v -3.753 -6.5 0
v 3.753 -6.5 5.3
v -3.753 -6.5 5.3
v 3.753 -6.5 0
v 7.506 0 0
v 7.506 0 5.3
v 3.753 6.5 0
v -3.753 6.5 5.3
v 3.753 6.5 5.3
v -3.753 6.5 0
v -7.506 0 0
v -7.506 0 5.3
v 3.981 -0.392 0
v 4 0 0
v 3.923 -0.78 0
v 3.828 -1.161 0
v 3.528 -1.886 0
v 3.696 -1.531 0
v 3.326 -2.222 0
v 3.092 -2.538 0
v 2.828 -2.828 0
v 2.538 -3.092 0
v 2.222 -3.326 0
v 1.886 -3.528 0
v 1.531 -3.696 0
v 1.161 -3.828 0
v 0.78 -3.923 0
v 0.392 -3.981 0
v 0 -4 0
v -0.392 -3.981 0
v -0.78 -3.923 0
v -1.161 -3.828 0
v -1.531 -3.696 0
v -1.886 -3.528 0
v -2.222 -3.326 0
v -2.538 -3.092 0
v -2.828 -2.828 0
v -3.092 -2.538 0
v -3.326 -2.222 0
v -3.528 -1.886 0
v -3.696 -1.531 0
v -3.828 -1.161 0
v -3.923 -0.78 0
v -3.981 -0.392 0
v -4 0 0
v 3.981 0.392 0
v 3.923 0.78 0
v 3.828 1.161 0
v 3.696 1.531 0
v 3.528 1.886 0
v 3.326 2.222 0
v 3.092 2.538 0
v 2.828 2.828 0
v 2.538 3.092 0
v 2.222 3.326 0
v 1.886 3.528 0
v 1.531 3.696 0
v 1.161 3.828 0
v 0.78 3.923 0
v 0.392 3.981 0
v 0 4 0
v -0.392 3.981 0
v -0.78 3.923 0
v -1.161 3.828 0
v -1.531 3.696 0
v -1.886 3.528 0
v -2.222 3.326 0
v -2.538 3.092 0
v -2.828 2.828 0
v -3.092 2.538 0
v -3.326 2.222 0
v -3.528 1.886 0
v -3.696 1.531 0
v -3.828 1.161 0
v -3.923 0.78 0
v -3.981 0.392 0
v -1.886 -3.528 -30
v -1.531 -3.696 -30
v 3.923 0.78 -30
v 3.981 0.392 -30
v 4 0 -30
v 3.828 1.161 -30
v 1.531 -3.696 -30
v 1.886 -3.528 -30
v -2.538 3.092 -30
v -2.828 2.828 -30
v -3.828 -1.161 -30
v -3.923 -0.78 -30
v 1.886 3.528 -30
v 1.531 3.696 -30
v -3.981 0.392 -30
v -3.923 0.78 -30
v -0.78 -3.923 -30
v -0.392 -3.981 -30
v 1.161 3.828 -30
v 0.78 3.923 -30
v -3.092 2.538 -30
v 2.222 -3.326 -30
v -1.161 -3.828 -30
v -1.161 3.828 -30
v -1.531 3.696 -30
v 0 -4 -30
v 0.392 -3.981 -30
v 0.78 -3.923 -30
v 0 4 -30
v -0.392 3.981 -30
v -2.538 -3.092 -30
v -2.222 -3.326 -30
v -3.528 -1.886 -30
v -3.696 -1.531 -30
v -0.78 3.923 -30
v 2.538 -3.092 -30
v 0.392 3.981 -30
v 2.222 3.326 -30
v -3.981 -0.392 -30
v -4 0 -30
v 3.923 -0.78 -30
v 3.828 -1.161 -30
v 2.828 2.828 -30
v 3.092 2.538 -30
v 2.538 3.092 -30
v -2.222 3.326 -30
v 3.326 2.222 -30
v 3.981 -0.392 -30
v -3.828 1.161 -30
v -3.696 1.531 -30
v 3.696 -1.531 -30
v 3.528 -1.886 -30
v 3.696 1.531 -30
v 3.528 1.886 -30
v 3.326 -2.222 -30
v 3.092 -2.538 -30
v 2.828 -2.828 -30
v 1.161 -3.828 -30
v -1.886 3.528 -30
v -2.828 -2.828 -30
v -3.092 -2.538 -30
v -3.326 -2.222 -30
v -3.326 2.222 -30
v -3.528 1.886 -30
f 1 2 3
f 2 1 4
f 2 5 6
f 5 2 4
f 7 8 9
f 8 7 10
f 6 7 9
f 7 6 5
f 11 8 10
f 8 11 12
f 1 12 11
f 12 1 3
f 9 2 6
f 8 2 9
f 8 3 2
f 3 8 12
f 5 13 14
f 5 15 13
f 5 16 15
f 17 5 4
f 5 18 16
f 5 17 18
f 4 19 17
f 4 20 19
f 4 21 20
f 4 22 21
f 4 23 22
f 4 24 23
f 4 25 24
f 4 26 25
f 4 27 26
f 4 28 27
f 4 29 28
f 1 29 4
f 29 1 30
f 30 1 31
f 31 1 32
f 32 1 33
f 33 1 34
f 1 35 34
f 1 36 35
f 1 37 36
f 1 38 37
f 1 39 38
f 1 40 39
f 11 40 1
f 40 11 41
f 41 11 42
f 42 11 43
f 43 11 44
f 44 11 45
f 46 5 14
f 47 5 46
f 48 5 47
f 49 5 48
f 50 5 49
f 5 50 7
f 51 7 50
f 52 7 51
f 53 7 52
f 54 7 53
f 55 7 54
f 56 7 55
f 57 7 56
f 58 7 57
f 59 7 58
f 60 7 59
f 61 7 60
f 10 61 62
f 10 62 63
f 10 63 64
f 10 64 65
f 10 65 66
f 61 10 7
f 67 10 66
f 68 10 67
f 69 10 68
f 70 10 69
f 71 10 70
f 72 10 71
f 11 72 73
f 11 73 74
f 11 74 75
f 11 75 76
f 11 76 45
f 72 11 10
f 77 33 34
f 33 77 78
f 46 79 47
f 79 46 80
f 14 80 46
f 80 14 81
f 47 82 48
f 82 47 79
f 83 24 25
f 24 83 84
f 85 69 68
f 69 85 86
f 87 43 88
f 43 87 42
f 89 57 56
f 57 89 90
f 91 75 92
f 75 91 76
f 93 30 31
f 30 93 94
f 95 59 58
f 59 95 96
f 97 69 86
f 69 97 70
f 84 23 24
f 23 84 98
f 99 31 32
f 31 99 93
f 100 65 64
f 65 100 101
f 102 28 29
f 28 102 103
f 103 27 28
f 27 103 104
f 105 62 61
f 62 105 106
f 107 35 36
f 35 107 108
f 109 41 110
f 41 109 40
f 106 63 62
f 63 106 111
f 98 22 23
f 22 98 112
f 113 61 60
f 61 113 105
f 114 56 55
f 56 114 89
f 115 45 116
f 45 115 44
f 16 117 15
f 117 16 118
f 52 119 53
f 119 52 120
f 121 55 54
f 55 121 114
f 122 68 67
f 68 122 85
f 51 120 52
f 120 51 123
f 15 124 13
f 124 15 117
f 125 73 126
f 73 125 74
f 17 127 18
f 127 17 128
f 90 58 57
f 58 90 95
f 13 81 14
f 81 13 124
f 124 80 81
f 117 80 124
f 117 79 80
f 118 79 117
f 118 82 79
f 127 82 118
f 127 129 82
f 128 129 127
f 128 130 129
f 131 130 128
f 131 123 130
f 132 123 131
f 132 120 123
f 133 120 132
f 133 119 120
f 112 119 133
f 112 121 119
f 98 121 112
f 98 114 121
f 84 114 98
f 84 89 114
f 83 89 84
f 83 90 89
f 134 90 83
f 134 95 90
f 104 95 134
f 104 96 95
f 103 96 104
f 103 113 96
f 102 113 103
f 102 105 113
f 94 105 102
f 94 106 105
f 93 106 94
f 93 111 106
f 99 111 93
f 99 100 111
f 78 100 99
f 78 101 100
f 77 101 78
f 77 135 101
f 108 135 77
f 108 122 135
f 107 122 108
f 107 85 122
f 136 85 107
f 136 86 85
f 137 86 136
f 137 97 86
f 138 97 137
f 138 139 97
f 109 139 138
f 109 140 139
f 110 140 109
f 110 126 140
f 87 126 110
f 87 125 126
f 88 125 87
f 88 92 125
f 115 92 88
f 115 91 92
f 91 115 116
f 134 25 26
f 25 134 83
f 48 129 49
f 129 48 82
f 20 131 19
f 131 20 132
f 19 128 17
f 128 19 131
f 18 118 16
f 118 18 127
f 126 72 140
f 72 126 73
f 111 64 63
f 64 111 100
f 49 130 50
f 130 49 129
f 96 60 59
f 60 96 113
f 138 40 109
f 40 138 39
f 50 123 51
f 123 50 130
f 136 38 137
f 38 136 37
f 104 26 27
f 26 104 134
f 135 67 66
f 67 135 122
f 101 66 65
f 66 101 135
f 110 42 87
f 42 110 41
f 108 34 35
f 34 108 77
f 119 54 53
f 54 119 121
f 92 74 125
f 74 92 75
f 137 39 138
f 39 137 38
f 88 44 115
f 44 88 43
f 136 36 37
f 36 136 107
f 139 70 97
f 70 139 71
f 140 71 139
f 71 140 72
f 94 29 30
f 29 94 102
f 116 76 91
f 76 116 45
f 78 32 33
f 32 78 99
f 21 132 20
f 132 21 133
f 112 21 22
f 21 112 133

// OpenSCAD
head_af = 13;
head_height = 5.3;
shank_diameter = 8;
shank_length = 30;

head_r = head_af / sqrt(3);

union() {
    cylinder(h = head_height, r = head_r, $fn = 6);
    translate([0, 0, -shank_length])
        cylinder(h = shank_length, d = shank_diameter, $fn = 64);
}
